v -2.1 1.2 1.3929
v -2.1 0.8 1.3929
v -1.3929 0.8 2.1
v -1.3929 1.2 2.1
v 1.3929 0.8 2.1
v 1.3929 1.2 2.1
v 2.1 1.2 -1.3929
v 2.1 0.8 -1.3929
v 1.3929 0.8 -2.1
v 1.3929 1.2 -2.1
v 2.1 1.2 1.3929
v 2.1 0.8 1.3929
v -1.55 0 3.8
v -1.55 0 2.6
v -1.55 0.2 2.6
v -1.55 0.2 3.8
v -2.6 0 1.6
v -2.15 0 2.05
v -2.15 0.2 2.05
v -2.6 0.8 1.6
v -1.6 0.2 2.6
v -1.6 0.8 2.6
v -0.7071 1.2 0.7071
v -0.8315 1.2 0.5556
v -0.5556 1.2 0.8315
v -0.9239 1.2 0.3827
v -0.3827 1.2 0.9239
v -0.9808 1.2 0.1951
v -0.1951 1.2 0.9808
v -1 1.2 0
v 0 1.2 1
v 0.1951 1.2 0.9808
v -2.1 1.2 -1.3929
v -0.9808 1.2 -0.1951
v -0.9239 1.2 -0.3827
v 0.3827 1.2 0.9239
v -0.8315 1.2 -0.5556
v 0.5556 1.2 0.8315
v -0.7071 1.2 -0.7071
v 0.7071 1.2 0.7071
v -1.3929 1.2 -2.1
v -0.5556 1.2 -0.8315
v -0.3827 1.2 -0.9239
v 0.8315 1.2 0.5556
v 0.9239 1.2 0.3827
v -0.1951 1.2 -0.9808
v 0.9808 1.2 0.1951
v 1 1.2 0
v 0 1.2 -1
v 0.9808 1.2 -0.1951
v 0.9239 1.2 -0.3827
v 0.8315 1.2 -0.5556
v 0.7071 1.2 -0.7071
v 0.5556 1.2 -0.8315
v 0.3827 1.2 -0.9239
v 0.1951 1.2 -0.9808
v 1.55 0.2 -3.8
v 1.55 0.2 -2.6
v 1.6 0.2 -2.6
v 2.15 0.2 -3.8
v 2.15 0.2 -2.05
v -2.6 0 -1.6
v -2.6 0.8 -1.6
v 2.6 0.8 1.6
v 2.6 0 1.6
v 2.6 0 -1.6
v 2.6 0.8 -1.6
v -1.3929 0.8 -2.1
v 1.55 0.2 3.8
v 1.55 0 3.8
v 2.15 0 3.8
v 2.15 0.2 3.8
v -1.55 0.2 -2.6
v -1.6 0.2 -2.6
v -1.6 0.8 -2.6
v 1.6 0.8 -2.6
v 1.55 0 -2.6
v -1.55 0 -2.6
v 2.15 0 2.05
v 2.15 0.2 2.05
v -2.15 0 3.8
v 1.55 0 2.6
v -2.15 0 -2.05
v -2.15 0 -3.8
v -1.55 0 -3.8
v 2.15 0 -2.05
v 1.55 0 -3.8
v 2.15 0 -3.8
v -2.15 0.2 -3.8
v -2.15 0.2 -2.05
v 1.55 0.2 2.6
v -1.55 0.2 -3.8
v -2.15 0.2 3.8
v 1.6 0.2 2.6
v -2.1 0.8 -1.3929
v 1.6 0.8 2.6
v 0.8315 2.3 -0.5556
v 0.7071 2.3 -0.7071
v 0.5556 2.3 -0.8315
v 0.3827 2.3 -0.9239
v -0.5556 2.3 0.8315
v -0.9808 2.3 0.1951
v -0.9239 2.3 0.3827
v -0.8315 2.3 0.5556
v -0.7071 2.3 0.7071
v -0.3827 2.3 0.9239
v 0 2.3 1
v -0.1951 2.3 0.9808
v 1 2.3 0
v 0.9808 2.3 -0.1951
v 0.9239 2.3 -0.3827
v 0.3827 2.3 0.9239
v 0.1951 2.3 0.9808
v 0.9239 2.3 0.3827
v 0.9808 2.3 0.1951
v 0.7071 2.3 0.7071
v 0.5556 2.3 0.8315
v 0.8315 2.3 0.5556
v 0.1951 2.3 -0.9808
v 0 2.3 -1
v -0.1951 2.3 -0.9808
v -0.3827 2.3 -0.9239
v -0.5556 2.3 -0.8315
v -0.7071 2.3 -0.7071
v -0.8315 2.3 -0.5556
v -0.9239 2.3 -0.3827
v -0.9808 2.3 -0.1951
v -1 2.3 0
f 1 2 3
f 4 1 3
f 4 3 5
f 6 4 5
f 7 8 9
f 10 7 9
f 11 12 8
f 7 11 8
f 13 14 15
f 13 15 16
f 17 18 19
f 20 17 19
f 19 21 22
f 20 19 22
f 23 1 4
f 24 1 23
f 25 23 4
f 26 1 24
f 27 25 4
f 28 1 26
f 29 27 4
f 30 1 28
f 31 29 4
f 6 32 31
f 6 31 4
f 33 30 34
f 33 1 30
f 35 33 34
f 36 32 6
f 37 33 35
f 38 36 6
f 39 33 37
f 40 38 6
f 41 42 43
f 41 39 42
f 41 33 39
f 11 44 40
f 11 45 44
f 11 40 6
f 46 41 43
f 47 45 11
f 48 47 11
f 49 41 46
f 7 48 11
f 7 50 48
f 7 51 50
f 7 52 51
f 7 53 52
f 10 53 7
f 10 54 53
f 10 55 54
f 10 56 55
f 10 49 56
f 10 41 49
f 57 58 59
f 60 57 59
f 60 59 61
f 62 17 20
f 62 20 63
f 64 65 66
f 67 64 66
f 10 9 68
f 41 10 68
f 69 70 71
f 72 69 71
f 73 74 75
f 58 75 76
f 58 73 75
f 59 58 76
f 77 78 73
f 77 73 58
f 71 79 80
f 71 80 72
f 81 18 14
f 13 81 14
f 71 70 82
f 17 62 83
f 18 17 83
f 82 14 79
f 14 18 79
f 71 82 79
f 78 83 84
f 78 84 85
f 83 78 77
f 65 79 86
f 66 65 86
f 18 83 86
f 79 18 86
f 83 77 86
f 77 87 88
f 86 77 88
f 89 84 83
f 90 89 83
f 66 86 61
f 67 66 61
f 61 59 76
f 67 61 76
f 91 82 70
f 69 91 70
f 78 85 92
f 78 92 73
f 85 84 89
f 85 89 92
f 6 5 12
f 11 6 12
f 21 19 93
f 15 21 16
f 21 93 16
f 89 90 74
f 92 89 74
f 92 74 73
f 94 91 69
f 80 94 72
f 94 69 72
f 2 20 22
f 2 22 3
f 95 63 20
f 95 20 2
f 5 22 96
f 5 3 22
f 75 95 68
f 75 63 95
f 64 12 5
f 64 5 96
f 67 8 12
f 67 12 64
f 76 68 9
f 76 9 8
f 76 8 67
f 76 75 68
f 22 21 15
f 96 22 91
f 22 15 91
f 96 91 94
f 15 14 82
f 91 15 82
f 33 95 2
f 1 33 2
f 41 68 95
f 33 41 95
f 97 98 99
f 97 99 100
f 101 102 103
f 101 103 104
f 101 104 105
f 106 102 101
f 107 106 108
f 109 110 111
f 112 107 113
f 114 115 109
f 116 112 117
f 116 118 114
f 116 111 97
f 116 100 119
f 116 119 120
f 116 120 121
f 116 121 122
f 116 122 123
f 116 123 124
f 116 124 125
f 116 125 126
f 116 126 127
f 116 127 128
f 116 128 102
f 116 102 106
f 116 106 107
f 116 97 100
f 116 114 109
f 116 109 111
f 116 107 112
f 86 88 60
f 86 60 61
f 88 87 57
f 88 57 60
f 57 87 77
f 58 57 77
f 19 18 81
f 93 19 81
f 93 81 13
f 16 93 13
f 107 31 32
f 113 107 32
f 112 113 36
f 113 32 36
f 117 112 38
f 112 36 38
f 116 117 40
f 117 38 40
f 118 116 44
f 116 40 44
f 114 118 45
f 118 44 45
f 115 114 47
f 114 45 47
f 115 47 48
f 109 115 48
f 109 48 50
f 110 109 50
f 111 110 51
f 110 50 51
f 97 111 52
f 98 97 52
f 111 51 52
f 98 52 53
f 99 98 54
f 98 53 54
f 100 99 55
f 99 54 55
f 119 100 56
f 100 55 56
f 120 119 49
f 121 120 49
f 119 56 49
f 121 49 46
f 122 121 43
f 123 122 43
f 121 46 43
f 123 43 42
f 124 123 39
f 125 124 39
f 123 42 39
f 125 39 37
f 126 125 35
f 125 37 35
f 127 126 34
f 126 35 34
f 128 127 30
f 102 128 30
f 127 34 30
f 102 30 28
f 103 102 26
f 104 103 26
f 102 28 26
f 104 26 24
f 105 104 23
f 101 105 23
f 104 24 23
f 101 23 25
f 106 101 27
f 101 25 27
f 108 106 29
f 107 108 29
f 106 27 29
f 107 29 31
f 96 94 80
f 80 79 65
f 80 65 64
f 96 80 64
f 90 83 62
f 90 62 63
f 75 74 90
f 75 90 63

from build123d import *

# Parameters (mm, degrees)
SKETCH_1_W         = 5.2
SKETCH_1_H         = 5.2
EXTRUDE_1_DEPTH    = 0.8
CHAMFER_1_SIZE     = 1
EXTRUDE_1_2_DEPTH  = 0.4
SKETCH_2_R         = 1
EXTRUDE_1110_DEPTH = 1.1
SKETCH_4_W         = 0.6
SKETCH_4_H         = 2.66831223
EXTRUDE_2_DEPTH    = 0.2


with BuildPart() as part:
    # 草图1 → Extrude 1 (new body)
    with BuildSketch(Plane(origin=(0, 0, 0), x_dir=(1, 0, 0), z_dir=(0, 1, 0))):
        Rectangle(SKETCH_1_W, SKETCH_1_H)
    extrude(amount=EXTRUDE_1_DEPTH)

    # 倒角1
    chamfer_1_edges = [part.edges().sort_by_distance(p)[0] for p in [
        (-2.6, 0.4, -2.6),
        (2.6, 0.4, -2.6),
        (2.6, 0.4, 2.6),
        (-2.6, 0.4, 2.6),
    ]]
    chamfer(chamfer_1_edges, length=CHAMFER_1_SIZE)

    # 草图3 → Extrude 1 2 (add)
    with BuildSketch(Plane(origin=(0, 0.8, 0), x_dir=(1, 0, 0), z_dir=(0, 1, 0))):
        Polygon((-2.1, 1.392893219), (-2.1, -1.392893219), (-1.392893219, -2.1), (1.392893219, -2.1), (2.1, -1.392893219), (2.1, 1.392893219), (1.392893219, 2.1), (-1.392893219, 2.1), align=None)
    extrude(amount=EXTRUDE_1_2_DEPTH)

    # 草图2 → Extrude 1110 (add)
    with BuildSketch(Plane(origin=(0, 1.2, 0), x_dir=(-1, 0, 0), z_dir=(0, 1, 0))):
        with Locations(Location((0, 0, 0), (0, 0, 90))):
            Circle(SKETCH_2_R)
    extrude(amount=EXTRUDE_1110_DEPTH)

    # 草图4 → 凸台-拉伸2 (add)
    with BuildSketch(Plane.XZ):
        with Locations((-1.85, 2.465843885)):
            Rectangle(SKETCH_4_W, SKETCH_4_H)
        with Locations((1.85, 2.465843885)):
            Rectangle(SKETCH_4_W, SKETCH_4_H)
        with Locations((1.85, -2.465843885)):
            Rectangle(SKETCH_4_W, SKETCH_4_H)
        with Locations((-1.85, -2.465843885)):
            Rectangle(SKETCH_4_W, SKETCH_4_H)
    extrude(amount=-EXTRUDE_2_DEPTH)


solid = part.part
